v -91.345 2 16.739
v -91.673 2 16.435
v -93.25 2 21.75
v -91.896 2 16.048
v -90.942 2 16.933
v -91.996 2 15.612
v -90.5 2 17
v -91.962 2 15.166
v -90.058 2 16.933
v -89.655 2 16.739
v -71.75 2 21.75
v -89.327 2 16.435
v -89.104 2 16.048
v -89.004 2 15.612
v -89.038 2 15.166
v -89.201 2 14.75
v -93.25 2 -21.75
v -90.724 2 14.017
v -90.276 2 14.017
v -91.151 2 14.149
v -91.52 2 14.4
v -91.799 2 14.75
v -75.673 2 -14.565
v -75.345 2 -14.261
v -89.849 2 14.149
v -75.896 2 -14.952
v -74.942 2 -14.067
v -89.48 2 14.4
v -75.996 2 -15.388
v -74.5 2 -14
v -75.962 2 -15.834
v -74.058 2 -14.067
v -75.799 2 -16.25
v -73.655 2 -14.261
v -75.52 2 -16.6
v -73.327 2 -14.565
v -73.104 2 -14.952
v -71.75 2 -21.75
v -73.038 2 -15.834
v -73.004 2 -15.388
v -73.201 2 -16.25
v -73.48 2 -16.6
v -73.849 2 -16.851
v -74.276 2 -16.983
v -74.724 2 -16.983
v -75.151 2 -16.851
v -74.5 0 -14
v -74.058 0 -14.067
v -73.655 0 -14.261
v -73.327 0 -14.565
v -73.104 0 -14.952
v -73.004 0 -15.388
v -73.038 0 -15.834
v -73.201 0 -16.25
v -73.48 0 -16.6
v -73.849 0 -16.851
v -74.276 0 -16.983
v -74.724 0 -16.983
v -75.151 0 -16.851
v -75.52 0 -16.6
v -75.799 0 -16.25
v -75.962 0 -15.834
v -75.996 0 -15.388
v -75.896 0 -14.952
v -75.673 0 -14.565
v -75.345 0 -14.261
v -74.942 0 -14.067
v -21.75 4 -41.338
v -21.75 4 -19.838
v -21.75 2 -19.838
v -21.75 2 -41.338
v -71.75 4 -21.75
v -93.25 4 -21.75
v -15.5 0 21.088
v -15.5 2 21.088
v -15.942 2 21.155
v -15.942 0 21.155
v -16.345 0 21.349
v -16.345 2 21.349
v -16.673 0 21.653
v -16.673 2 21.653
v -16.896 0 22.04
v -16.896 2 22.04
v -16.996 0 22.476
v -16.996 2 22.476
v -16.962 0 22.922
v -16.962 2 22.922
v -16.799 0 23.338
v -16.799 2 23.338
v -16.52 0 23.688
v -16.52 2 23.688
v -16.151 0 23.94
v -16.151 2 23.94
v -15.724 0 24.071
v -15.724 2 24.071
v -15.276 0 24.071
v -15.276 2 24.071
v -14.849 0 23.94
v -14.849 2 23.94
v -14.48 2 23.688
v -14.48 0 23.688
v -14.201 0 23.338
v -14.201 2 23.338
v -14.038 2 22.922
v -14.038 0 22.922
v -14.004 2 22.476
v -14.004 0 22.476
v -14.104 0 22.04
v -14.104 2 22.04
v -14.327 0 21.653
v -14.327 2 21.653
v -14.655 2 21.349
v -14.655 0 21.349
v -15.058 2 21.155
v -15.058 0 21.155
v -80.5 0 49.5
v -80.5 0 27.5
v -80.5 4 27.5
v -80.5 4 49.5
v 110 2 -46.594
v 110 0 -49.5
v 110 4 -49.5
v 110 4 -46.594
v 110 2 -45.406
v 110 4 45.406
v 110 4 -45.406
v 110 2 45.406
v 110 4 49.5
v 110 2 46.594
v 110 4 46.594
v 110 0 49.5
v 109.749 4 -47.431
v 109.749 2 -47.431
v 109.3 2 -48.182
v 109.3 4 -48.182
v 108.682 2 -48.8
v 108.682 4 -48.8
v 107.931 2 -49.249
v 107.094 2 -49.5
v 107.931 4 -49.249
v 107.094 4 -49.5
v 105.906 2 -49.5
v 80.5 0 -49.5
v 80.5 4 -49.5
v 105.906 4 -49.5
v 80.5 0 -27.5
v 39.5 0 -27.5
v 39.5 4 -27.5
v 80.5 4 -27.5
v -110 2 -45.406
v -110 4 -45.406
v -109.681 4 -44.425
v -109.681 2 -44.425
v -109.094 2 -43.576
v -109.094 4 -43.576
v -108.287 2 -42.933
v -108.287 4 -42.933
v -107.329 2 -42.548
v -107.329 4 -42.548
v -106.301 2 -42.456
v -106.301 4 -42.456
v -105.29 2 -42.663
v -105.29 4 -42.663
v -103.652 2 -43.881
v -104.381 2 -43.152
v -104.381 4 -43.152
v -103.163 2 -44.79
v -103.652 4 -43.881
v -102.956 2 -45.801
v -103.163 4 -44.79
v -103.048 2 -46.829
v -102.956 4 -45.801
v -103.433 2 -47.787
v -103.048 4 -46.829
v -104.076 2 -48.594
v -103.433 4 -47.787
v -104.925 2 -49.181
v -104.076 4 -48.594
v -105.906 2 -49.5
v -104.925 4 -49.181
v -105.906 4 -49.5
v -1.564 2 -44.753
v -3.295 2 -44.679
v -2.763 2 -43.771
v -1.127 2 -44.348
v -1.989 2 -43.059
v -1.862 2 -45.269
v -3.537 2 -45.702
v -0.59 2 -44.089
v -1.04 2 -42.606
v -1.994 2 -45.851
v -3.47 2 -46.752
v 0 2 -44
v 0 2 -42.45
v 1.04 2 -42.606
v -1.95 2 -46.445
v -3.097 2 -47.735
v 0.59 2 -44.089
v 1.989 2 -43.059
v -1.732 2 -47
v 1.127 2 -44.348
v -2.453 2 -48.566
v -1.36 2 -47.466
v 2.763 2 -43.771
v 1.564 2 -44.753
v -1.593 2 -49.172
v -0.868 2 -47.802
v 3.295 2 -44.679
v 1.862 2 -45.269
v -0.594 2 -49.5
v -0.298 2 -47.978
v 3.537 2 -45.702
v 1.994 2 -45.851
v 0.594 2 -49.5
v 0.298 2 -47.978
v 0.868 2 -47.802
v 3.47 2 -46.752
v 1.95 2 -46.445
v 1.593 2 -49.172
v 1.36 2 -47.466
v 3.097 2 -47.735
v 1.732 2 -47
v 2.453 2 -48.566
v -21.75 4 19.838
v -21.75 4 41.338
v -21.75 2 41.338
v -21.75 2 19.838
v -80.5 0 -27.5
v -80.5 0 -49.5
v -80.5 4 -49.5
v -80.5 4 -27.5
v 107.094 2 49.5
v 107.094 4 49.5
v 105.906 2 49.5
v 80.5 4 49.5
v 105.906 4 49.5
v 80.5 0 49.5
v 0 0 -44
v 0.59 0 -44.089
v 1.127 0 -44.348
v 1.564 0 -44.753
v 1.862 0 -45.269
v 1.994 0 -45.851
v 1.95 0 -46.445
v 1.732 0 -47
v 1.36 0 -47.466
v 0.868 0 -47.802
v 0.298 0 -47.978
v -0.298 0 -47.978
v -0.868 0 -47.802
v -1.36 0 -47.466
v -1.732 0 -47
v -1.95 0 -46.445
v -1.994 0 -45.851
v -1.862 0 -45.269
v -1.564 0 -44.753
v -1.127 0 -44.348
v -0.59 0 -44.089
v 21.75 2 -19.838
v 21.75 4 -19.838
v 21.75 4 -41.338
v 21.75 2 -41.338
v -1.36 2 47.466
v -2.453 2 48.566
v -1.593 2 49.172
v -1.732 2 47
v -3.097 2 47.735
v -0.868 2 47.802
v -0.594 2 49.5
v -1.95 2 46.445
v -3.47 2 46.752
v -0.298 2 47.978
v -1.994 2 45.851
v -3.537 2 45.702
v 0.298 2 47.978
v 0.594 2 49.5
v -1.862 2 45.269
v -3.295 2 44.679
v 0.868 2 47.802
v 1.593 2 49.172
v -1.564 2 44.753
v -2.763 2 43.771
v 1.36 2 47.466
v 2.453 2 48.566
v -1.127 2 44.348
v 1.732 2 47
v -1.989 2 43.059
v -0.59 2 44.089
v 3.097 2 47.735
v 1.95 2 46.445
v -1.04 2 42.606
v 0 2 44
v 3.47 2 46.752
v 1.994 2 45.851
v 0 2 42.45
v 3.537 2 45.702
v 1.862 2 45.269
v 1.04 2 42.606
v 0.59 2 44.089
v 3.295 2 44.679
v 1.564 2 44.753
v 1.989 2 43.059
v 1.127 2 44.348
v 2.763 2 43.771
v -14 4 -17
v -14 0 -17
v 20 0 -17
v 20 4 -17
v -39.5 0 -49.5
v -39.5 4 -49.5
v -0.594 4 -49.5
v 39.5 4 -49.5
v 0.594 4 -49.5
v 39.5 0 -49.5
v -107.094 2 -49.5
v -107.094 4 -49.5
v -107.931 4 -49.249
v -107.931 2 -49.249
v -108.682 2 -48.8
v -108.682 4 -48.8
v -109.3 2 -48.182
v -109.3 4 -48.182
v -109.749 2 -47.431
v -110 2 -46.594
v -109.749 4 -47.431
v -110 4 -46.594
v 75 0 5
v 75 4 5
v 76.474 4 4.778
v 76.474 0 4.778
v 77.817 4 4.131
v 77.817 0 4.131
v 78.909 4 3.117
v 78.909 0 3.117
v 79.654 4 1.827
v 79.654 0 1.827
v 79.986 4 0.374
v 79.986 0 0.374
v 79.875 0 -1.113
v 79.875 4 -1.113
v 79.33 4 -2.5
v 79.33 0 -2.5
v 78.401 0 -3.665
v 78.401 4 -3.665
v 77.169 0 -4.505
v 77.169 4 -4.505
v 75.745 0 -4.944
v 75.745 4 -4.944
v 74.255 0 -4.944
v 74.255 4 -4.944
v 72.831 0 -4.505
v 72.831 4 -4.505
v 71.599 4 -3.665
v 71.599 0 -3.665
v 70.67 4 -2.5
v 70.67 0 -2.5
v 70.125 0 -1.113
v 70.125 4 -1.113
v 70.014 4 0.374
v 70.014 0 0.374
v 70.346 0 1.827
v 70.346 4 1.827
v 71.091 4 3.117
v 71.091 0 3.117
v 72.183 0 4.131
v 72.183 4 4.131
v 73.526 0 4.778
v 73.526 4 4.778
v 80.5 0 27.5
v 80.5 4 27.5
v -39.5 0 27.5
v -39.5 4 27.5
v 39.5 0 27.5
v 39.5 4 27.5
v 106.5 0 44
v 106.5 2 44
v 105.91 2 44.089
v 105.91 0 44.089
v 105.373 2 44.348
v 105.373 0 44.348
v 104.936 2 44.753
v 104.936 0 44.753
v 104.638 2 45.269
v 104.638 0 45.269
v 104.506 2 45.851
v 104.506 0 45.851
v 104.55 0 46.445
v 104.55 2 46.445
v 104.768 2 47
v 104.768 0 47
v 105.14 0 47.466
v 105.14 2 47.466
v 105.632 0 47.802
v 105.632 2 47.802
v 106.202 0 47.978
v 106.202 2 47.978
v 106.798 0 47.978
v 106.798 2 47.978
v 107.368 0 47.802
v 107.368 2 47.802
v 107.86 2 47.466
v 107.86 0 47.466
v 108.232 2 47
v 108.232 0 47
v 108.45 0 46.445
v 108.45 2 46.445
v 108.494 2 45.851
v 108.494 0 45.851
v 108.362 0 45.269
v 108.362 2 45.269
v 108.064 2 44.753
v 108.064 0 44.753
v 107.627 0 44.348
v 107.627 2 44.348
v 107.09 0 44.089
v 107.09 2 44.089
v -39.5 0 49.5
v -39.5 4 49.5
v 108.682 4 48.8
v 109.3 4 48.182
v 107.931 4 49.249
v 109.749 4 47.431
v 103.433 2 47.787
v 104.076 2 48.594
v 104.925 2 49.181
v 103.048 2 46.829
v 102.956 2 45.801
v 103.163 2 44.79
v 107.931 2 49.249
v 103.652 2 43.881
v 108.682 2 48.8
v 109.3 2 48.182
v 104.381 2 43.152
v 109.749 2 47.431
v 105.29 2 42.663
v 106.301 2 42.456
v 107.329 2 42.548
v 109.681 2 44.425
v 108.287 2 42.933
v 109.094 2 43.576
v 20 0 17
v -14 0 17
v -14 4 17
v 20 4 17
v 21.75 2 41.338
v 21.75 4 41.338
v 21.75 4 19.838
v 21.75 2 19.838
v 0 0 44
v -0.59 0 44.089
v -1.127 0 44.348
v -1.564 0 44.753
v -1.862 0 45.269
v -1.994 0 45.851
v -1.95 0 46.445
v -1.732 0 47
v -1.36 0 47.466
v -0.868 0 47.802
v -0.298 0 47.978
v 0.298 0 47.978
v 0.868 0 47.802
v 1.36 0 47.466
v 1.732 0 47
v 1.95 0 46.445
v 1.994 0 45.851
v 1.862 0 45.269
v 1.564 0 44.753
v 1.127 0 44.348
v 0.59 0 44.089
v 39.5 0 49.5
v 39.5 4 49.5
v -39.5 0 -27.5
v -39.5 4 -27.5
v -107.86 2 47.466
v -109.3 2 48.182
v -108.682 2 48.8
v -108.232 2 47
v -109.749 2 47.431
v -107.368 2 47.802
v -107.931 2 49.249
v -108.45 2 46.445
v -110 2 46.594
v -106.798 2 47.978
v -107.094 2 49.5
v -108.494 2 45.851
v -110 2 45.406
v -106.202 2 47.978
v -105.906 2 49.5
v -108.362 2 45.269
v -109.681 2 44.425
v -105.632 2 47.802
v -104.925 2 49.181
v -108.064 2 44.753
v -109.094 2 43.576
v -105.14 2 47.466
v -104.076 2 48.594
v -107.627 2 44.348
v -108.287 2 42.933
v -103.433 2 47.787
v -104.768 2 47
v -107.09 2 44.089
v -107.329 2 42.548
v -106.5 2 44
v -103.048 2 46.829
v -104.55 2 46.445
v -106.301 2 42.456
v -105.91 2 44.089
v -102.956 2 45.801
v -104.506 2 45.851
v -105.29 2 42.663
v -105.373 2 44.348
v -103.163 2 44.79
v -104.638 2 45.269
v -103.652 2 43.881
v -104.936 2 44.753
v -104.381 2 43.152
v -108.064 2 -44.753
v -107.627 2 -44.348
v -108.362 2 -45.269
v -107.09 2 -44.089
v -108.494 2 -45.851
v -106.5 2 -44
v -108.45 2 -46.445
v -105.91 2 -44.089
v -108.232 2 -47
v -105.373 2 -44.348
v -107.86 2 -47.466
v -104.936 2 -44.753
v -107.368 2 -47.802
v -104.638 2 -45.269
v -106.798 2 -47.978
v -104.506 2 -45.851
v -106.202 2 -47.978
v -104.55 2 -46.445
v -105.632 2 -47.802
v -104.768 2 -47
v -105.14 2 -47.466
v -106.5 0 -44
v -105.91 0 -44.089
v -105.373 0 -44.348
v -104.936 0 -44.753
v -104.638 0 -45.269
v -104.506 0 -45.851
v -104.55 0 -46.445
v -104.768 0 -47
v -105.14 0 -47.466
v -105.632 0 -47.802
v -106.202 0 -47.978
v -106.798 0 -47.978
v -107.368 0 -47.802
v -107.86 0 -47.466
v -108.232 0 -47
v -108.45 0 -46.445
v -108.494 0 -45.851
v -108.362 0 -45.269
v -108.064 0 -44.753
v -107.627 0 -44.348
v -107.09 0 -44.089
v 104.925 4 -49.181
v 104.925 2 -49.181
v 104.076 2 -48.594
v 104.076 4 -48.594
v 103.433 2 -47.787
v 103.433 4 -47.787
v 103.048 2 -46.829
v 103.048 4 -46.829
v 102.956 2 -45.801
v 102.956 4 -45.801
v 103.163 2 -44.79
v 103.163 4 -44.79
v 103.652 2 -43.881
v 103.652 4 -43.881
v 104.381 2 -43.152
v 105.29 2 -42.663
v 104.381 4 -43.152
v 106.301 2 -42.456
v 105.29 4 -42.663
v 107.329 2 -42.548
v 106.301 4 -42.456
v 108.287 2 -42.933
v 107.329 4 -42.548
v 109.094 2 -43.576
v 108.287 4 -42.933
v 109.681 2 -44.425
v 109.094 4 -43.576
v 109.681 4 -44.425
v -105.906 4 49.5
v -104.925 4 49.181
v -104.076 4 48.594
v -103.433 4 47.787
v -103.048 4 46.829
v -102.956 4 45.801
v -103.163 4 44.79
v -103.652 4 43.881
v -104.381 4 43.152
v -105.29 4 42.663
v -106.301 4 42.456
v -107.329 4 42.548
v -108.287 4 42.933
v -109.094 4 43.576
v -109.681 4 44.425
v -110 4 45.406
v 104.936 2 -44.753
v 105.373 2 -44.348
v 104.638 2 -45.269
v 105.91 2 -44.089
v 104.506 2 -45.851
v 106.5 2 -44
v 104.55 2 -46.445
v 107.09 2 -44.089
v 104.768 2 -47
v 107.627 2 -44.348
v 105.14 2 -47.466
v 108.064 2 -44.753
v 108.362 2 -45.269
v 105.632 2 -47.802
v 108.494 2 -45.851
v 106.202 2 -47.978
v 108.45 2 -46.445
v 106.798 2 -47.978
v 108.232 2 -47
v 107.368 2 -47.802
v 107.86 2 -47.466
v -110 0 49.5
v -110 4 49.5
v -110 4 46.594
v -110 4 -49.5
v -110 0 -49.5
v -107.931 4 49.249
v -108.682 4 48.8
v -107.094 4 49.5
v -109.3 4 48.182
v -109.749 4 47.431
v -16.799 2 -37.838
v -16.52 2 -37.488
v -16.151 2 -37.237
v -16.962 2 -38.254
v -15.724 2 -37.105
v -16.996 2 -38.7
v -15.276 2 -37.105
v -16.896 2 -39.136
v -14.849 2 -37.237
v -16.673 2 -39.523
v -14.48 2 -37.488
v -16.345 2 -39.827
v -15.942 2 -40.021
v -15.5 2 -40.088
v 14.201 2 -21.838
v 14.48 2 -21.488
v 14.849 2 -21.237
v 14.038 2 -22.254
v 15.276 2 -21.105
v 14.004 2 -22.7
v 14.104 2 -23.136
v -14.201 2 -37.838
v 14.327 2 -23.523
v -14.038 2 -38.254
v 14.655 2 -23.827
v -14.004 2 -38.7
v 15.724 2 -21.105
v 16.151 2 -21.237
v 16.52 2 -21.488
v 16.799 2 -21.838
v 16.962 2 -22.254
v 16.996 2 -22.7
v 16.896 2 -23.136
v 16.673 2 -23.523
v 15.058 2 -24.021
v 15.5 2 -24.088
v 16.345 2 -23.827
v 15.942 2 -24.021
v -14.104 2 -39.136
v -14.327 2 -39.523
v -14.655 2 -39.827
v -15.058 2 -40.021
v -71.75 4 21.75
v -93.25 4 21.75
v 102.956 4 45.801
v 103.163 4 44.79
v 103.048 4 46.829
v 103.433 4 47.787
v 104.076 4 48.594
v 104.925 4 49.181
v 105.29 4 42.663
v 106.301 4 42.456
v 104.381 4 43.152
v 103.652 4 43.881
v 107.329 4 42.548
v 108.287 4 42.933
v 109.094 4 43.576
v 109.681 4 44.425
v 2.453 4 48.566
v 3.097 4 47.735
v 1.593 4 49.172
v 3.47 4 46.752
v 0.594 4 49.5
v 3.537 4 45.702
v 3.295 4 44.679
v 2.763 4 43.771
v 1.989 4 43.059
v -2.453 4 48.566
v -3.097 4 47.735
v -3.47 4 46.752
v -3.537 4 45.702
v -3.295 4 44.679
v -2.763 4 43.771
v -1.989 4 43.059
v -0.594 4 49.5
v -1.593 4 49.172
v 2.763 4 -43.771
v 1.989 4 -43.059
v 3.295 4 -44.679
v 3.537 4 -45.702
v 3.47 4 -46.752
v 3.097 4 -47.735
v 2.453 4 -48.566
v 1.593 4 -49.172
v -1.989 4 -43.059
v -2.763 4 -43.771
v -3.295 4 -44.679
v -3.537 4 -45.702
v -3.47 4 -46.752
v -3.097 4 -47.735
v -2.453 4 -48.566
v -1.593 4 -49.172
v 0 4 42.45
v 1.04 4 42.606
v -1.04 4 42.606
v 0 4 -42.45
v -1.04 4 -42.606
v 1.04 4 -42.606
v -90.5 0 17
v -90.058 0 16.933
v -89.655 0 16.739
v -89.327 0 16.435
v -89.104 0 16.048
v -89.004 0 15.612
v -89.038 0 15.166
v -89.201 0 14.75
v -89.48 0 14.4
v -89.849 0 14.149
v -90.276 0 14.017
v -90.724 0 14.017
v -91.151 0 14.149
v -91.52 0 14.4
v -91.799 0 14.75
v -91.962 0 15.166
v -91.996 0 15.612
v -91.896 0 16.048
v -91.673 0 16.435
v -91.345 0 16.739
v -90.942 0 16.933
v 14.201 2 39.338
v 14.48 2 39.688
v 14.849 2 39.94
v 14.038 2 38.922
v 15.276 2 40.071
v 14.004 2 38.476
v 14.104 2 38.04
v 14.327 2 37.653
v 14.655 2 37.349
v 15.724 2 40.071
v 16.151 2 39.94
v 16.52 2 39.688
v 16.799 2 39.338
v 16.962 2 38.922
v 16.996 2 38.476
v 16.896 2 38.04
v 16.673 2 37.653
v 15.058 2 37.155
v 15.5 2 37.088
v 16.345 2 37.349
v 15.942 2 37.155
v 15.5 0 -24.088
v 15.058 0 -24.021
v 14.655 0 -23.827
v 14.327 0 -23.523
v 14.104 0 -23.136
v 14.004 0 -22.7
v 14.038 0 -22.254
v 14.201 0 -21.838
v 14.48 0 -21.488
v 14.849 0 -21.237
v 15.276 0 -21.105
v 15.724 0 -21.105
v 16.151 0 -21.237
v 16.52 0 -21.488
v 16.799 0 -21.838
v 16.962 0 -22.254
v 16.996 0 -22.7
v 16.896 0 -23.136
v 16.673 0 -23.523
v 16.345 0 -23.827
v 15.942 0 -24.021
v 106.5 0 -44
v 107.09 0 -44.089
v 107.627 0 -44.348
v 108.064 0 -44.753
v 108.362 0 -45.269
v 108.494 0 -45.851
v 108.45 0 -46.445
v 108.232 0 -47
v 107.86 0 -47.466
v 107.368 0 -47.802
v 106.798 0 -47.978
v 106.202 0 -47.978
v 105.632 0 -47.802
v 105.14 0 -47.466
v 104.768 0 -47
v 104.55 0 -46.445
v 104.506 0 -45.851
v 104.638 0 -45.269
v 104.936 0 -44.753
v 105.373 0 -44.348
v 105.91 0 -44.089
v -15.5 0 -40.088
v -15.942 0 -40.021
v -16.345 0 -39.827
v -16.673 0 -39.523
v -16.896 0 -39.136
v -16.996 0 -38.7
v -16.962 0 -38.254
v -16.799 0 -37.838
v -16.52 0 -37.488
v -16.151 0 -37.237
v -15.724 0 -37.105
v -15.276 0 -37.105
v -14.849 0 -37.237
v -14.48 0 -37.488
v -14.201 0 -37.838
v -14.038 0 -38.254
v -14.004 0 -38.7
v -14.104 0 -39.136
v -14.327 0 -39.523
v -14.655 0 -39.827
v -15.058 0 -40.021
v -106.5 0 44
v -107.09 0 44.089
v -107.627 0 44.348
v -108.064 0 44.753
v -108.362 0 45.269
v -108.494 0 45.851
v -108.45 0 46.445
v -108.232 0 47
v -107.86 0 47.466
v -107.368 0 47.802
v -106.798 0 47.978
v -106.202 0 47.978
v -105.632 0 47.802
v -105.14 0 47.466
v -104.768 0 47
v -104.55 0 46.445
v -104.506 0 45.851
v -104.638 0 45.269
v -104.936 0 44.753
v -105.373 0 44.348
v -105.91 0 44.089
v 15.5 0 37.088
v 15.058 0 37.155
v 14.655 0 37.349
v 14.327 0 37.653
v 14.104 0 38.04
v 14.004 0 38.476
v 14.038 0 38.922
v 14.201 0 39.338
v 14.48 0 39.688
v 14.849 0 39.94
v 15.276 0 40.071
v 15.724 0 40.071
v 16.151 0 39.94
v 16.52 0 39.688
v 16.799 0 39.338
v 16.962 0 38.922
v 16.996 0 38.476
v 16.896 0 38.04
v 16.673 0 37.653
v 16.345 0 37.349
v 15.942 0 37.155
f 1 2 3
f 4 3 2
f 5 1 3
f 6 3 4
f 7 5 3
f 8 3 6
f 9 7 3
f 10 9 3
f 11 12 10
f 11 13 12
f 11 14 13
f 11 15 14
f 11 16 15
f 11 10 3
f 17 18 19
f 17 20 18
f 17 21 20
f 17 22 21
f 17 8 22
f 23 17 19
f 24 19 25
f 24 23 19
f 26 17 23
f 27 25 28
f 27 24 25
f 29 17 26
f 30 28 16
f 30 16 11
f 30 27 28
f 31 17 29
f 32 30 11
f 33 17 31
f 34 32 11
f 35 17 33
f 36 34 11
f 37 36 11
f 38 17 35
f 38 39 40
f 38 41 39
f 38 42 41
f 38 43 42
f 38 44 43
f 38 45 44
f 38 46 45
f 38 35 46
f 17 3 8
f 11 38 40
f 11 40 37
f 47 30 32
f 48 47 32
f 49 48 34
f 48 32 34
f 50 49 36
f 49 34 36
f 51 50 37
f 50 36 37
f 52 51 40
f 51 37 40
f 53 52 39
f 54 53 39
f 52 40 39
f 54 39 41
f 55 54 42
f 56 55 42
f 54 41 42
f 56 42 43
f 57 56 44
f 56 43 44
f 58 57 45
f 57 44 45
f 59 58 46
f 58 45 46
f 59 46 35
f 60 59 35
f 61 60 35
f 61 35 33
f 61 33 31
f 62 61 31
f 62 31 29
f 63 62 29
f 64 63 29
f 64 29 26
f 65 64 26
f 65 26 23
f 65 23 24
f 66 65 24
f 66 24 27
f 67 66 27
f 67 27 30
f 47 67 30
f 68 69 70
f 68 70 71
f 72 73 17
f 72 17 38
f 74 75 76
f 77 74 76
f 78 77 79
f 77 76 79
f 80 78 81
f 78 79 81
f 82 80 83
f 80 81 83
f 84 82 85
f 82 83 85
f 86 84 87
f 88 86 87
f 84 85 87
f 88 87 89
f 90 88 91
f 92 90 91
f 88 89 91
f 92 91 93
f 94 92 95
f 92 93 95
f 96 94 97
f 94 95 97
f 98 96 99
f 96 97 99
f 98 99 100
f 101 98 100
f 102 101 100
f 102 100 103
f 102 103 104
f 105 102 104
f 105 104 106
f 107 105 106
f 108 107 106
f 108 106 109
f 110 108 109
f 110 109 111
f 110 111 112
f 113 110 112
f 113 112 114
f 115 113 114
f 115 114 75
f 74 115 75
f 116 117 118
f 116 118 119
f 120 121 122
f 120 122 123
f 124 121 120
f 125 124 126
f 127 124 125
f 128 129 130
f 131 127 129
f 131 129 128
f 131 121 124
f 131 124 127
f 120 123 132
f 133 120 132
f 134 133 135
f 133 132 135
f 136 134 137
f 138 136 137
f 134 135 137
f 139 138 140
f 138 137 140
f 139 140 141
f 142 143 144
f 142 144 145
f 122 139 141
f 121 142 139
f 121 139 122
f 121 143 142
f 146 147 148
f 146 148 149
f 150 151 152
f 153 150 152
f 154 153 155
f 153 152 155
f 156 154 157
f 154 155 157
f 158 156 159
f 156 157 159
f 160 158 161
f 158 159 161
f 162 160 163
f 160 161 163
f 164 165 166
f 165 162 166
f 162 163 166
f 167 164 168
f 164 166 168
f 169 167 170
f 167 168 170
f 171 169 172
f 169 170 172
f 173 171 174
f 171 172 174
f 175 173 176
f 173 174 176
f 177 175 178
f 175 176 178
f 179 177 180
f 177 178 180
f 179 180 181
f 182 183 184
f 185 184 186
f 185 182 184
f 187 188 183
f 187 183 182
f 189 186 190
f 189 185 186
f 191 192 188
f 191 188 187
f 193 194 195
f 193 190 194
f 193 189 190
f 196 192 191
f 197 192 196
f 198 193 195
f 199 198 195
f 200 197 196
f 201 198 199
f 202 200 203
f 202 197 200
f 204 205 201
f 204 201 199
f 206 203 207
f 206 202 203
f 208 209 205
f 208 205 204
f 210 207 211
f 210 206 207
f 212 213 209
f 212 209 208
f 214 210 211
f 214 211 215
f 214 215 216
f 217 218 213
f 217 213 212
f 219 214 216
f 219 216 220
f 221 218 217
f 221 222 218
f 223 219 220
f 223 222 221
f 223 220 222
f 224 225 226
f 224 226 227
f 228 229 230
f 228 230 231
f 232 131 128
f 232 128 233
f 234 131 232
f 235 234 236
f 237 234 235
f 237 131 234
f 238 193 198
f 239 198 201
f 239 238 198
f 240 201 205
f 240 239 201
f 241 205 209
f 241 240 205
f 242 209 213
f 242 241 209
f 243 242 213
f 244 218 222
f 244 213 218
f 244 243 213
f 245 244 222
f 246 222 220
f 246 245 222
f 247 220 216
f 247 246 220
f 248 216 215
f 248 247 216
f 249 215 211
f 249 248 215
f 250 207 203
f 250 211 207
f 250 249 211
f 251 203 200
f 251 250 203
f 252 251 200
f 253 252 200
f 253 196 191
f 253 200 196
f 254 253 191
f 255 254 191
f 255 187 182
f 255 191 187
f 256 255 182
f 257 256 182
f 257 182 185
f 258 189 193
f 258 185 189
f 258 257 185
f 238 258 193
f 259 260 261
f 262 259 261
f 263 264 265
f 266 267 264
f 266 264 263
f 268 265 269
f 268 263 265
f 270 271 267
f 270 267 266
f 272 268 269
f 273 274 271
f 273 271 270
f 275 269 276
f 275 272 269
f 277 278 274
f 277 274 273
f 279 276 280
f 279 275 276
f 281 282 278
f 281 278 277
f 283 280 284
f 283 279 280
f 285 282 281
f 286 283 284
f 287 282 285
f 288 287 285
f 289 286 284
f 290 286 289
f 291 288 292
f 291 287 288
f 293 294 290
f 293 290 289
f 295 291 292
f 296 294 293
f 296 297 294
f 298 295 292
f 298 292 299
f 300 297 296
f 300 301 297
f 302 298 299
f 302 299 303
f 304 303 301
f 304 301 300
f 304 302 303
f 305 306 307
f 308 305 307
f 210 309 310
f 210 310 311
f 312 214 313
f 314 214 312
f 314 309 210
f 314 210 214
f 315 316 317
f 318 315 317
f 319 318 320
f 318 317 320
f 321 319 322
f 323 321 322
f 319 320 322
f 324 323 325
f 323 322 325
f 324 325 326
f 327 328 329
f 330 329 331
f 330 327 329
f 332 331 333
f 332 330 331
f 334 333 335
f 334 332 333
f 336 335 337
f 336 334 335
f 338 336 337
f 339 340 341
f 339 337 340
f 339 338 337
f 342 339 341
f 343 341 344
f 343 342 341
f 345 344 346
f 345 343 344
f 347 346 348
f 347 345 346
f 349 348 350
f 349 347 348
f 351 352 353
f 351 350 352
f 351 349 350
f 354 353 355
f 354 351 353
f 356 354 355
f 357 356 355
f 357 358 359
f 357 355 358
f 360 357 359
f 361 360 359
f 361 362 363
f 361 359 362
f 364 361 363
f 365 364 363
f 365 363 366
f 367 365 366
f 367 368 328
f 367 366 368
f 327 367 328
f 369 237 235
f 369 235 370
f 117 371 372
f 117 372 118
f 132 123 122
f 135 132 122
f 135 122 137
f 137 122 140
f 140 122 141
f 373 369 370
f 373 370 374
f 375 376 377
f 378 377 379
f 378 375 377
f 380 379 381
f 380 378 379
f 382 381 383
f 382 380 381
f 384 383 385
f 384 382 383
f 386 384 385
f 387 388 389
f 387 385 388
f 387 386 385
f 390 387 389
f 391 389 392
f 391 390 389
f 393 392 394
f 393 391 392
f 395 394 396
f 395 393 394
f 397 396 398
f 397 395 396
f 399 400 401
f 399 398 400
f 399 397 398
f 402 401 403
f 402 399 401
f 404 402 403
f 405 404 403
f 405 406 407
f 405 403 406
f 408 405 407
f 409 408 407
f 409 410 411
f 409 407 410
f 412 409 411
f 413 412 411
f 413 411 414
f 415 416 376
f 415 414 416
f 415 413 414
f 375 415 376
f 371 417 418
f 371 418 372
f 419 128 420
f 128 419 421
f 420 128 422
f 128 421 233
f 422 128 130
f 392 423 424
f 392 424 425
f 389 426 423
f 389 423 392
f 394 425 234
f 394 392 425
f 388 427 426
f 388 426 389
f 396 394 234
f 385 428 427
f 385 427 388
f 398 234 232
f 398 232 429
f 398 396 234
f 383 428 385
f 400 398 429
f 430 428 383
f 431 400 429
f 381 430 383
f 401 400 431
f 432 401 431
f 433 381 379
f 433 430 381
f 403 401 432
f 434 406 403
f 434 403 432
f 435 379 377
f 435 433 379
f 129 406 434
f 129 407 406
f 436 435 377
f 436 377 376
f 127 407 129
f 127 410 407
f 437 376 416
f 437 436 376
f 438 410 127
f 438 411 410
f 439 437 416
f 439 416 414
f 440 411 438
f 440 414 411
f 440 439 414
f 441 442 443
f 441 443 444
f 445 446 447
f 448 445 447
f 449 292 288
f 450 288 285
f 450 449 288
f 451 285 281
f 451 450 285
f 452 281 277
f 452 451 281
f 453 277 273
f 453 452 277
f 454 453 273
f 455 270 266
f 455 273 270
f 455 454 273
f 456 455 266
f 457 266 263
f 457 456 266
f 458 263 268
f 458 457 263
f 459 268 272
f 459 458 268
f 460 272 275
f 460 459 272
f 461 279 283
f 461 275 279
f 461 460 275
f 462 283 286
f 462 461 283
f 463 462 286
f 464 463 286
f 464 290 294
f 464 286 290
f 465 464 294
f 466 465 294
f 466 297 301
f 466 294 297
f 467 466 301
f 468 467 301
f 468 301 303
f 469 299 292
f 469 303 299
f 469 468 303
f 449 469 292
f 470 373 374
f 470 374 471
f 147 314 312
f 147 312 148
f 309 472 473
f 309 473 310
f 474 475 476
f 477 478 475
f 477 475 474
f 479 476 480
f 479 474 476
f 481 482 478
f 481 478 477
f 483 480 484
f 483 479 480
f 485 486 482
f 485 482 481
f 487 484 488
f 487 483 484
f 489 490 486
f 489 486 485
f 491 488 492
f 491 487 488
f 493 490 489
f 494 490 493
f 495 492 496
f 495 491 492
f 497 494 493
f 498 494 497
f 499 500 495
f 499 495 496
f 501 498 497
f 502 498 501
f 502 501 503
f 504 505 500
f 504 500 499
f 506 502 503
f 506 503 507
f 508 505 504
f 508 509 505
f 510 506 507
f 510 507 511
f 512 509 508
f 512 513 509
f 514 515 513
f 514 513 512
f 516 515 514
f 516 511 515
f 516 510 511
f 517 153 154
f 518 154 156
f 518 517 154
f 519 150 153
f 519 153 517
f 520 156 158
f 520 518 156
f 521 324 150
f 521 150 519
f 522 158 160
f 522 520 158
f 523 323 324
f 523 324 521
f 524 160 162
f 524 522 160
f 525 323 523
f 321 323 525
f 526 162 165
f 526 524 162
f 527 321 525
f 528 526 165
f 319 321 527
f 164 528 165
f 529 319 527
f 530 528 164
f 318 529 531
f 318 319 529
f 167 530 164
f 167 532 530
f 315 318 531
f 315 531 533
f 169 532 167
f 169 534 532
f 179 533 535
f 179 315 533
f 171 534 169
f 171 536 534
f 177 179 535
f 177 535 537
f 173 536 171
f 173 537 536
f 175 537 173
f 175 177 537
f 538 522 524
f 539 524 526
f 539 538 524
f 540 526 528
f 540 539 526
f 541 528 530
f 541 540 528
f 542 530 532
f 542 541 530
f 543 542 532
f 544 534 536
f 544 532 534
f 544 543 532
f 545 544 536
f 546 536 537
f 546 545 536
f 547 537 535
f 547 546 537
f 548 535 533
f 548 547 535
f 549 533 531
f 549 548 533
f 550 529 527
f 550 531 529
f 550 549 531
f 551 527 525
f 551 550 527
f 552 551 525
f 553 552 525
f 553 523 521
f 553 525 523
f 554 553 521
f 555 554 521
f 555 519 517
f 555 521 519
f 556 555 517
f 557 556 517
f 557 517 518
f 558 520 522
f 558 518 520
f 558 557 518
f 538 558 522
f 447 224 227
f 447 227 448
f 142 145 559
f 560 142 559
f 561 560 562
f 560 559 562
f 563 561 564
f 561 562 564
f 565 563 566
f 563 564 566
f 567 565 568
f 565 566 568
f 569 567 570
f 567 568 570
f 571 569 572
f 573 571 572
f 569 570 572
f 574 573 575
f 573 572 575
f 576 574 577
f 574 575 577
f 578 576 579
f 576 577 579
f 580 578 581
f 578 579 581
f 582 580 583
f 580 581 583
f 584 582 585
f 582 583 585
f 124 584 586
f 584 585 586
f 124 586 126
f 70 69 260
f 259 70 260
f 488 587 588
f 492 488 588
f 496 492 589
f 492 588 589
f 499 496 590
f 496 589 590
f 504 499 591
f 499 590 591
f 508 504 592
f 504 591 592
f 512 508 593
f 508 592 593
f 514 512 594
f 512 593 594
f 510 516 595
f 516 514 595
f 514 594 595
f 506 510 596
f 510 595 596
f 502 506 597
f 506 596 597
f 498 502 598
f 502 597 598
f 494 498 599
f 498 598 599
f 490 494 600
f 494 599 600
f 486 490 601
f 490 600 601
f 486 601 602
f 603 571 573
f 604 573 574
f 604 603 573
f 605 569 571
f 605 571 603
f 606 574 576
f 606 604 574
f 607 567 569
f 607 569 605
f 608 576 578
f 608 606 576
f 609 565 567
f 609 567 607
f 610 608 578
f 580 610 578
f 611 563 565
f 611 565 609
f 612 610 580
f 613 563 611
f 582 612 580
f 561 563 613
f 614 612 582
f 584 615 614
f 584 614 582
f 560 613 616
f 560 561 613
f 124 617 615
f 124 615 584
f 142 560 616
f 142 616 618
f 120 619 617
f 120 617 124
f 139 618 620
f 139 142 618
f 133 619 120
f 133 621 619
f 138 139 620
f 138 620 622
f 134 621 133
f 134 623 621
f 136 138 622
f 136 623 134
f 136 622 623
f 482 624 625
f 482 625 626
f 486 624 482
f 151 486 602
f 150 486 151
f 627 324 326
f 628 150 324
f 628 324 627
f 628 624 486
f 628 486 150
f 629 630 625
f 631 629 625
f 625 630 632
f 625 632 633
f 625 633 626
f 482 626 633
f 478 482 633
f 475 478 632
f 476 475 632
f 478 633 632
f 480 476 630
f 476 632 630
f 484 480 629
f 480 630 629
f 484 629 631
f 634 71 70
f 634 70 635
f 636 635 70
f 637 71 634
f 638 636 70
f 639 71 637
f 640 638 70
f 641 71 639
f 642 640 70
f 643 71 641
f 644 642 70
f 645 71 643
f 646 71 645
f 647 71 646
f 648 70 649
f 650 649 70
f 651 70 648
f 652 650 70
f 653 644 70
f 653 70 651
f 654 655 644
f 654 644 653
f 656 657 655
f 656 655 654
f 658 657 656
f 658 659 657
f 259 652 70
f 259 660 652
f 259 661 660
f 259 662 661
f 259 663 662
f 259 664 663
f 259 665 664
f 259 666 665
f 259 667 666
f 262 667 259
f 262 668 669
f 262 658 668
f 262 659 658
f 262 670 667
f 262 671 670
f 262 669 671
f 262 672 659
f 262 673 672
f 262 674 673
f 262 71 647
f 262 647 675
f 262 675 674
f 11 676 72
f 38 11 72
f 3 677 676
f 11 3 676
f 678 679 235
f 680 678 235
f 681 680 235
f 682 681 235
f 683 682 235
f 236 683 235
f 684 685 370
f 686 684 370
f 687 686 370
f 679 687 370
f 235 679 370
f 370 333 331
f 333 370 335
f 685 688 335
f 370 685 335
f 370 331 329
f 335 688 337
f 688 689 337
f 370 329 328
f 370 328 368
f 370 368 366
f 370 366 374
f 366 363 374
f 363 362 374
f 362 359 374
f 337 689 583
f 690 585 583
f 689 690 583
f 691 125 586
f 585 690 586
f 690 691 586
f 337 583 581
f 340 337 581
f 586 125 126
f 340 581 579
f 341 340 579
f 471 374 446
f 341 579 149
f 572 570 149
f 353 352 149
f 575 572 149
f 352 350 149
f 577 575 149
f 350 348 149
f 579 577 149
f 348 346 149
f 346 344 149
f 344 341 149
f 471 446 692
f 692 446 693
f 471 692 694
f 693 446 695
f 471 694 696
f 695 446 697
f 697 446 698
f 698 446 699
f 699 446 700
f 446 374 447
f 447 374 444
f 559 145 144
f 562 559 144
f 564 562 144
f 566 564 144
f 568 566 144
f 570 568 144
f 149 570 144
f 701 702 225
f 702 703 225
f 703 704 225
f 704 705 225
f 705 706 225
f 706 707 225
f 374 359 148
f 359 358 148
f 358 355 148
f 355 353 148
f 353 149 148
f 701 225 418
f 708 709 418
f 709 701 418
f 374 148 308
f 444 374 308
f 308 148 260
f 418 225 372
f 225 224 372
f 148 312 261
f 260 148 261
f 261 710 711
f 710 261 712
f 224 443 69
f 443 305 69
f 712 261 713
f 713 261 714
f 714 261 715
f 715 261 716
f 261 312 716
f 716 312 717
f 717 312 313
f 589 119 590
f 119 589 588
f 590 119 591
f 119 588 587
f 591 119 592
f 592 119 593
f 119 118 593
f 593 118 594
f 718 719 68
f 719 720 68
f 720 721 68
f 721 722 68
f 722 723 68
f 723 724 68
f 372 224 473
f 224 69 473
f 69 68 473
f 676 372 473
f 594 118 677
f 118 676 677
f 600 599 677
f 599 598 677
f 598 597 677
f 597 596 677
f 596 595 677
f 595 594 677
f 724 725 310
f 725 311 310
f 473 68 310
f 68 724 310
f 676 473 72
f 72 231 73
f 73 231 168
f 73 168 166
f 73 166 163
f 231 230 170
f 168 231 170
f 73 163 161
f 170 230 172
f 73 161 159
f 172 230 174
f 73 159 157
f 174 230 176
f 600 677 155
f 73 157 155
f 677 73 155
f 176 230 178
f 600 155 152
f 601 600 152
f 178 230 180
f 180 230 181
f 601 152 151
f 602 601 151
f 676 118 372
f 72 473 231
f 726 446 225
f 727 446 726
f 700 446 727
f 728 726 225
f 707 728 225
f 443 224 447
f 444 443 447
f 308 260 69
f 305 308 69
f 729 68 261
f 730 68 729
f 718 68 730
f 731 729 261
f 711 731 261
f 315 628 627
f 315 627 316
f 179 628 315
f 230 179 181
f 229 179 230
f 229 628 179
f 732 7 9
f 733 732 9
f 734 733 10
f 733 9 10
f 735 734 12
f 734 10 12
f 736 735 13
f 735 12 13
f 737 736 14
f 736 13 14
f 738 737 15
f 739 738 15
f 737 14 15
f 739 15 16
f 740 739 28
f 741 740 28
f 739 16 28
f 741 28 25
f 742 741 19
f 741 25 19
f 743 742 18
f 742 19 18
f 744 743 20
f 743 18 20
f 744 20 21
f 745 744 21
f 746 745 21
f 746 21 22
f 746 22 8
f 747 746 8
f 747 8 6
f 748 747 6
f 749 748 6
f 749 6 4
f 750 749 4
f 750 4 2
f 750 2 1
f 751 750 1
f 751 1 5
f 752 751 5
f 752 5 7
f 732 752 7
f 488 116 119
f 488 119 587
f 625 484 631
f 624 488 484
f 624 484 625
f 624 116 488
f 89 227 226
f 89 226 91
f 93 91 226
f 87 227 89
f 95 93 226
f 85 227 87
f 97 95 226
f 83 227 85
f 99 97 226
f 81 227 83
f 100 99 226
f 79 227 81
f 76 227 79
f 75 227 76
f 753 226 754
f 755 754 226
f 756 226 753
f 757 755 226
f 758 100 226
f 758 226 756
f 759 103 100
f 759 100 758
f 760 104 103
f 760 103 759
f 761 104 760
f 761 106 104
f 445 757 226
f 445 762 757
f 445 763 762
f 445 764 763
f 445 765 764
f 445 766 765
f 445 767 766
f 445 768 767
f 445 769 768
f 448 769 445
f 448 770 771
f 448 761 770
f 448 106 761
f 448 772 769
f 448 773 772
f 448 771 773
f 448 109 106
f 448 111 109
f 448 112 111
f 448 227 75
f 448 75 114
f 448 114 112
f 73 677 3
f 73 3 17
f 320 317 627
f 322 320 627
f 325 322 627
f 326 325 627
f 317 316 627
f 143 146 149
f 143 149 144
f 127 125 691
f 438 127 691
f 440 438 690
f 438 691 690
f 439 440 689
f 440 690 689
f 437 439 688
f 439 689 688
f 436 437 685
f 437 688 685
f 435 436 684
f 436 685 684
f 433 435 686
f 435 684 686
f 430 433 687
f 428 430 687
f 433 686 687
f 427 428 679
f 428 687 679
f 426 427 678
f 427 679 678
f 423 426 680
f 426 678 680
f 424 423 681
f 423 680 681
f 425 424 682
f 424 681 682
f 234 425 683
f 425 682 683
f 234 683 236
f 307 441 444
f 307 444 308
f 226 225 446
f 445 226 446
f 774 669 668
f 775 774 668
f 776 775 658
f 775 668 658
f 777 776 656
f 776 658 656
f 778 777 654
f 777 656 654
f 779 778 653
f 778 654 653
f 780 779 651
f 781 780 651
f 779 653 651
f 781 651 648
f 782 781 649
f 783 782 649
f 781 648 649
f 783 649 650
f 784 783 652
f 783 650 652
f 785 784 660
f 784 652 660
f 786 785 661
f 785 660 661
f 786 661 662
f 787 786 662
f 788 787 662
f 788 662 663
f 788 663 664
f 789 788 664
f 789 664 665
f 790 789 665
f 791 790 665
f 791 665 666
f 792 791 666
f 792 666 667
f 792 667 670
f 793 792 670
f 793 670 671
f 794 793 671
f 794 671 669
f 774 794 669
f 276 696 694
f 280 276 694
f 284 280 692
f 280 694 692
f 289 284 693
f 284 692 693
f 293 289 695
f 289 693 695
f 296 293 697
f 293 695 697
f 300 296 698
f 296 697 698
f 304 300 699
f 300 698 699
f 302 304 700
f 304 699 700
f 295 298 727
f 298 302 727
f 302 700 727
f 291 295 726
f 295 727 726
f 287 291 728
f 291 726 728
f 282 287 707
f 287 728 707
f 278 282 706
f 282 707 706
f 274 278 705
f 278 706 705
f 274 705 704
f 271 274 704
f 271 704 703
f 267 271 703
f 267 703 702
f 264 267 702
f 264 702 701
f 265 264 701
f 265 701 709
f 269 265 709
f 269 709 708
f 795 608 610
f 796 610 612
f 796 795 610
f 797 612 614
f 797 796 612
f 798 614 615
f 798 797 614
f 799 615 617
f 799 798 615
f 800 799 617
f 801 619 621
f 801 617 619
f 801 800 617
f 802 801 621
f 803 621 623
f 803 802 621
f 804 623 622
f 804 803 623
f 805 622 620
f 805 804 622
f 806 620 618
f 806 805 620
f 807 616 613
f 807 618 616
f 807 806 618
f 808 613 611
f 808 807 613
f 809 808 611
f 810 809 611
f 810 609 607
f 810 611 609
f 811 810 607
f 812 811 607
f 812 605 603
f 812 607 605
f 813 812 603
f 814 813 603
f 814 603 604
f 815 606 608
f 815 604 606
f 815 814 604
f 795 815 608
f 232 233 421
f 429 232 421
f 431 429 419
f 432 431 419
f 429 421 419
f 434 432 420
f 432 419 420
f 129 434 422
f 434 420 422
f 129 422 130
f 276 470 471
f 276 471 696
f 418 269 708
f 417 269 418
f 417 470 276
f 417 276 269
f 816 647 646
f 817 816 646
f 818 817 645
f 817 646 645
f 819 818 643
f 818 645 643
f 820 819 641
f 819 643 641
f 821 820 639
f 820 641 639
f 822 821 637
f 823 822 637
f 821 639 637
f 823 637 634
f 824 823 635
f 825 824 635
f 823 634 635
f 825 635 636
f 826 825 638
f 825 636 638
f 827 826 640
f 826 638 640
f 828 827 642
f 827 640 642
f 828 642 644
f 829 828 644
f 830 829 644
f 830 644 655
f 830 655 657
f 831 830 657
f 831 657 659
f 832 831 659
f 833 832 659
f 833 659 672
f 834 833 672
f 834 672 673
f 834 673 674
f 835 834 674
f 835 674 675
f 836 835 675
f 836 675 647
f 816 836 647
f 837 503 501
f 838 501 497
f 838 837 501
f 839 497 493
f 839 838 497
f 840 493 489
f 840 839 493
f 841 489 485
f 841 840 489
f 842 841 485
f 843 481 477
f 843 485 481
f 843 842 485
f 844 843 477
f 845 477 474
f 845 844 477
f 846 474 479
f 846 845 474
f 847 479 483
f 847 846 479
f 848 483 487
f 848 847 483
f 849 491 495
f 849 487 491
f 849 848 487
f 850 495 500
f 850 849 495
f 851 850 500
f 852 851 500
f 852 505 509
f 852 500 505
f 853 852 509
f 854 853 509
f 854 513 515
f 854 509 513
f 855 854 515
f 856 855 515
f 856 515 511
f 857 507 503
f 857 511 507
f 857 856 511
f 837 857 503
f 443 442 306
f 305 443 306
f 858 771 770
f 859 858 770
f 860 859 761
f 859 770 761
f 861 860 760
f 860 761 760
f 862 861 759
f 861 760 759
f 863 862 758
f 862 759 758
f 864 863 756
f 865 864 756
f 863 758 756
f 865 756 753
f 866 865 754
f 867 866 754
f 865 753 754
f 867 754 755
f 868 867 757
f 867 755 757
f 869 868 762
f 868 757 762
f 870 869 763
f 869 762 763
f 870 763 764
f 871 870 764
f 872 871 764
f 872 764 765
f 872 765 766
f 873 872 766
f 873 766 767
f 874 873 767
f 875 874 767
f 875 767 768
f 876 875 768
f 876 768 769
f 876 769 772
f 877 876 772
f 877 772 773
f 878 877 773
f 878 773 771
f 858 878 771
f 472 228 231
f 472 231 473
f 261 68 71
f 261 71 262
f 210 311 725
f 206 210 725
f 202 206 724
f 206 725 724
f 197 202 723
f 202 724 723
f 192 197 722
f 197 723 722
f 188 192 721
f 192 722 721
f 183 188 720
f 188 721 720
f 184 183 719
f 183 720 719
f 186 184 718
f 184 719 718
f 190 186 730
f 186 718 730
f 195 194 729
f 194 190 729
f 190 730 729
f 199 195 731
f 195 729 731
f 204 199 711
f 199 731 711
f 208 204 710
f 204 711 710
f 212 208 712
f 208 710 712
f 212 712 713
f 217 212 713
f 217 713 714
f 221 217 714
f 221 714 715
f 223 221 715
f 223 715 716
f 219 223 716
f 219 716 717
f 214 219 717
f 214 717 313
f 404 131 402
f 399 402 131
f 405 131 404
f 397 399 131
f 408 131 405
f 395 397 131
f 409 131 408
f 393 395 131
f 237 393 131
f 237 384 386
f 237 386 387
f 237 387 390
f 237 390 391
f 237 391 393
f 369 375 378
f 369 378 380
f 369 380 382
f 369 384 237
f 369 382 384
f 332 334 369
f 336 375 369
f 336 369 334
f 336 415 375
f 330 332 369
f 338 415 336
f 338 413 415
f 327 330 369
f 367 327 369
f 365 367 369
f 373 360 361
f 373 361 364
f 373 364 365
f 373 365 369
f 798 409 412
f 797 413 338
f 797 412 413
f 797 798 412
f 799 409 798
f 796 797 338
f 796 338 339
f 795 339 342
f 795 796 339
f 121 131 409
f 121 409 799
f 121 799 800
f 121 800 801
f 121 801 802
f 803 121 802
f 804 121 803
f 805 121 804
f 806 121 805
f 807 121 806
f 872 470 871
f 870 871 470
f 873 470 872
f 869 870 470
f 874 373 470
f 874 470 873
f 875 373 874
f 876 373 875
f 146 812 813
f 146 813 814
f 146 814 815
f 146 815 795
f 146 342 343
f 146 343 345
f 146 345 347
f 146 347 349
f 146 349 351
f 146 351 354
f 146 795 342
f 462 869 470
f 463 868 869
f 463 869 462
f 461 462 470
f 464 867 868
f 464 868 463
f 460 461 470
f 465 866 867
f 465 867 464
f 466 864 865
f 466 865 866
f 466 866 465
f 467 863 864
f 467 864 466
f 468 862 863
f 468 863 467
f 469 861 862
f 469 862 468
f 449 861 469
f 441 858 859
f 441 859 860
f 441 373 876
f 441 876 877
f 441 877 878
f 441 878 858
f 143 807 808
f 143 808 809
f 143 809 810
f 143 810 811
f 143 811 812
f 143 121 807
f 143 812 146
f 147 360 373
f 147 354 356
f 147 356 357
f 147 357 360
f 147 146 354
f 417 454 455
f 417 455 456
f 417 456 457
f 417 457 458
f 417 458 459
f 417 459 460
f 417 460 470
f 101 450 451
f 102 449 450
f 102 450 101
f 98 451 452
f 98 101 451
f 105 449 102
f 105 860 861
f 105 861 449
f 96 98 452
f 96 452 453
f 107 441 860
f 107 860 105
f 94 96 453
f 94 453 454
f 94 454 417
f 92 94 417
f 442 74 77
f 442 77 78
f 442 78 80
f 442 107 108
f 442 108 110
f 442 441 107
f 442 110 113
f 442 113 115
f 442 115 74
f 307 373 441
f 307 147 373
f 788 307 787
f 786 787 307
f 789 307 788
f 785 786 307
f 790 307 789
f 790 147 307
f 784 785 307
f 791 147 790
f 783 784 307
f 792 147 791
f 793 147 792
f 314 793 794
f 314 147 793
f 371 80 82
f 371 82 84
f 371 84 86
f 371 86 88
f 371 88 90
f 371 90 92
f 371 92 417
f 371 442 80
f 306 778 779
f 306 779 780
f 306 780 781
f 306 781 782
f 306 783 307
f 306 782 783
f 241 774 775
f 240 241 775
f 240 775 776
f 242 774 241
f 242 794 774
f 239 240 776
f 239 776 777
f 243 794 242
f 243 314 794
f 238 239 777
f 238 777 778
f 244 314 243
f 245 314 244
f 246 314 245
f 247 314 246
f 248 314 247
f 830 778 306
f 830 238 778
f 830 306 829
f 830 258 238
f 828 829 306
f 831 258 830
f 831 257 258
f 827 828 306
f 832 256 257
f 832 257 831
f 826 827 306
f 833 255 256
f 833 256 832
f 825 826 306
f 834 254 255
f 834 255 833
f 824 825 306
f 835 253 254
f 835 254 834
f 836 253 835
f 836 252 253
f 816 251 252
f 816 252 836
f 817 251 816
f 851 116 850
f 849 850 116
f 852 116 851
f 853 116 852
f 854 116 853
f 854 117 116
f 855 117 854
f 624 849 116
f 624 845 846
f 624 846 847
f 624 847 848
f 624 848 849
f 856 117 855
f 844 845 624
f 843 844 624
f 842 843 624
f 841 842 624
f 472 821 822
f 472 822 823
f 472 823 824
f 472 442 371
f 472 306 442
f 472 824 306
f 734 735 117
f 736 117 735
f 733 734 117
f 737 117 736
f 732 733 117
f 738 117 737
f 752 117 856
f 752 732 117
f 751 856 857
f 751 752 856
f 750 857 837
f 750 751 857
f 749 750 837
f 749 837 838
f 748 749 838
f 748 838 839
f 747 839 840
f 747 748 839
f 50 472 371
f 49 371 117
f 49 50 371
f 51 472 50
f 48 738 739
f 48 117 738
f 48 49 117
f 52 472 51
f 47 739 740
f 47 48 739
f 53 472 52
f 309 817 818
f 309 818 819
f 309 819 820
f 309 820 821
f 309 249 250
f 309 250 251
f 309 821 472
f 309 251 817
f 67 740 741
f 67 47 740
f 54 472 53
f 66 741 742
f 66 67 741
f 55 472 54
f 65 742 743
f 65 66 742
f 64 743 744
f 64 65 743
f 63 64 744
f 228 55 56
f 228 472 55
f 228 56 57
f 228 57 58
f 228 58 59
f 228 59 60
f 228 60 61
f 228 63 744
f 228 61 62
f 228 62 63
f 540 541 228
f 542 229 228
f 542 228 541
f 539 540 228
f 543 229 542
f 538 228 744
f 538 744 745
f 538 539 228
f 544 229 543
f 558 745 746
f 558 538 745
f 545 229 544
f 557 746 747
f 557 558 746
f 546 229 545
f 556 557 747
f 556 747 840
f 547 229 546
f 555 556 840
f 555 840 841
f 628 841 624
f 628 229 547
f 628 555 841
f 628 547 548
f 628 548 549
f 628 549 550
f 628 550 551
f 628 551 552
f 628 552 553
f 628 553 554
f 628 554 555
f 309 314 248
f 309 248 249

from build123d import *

# Parameters (mm, degrees)
EXTRUDE_1_DEPTH      = 4
SKETCH_11_R          = 2
SKETCH_11_R_2        = 5
SKETCH_11_W          = 34
SKETCH_11_H          = 34
CUT_EXTRUDE_8_DEPTH  = 121.690720439
SKETCH_12_R          = 3.55
CUT_EXTRUDE_9_DEPTH  = 2
SKETCH_13_W          = 21.5
SKETCH_13_H          = 43.5
SKETCH_13_W_2        = 43.5
SKETCH_13_H_2        = 21.5
CUT_EXTRUDE_10_DEPTH = 2
SKETCH_14_R          = 1.5
CUT_EXTRUDE_11_DEPTH = 121.640996349


with BuildPart() as part:
    # 草圖1 → 填料-伸長1 (new body)
    with BuildSketch(Plane(origin=(0, 0, 0), x_dir=(1, 0, 0), z_dir=(0, 1, 0))):
        Polygon((-39.5, 49.5), (39.5, 49.5), (39.5, 27.5), (80.5, 27.5), (80.5, 49.5), (110, 49.5), (110, -49.5), (80.5, -49.5), (80.5, -27.5), (39.5, -27.5), (39.5, -49.5), (-39.5, -49.5), (-39.5, -27.5), (-80.5, -27.5), (-80.5, -49.5), (-110, -49.5), (-110, 49.5), (-80.5, 49.5), (-80.5, 27.5), (-39.5, 27.5), align=None)
    extrude(amount=EXTRUDE_1_DEPTH)

    # 草圖11 → 除料-伸長8 (cut, through all)
    with BuildSketch(Plane(origin=(0, 0, 0), x_dir=(1, 0, 0), z_dir=(0, 1, 0))):
        with Locations(Location((-106.5, 46, 0), (0, 0, 270))):
            Circle(SKETCH_11_R)
        with Locations(Location((-2.39e-07, 46, 0), (0, 0, 270))):
            Circle(SKETCH_11_R)
        with Locations(Location((106.5, 46, 0), (0, 0, 270))):
            Circle(SKETCH_11_R)
        with Locations(Location((-2.39e-07, -46, 0), (0, 0, 90))):
            Circle(SKETCH_11_R)
        with Locations(Location((-106.5, -46, 0), (0, 0, 90))):
            Circle(SKETCH_11_R)
        with Locations(Location((106.5, -46, 0), (0, 0, 90))):
            Circle(SKETCH_11_R)
        with Locations(Location((75, 0, 0), (0, 0, 270))):
            Circle(SKETCH_11_R_2)
        with Locations((3, 0)):
            Rectangle(SKETCH_11_W, SKETCH_11_H)
    extrude(amount=CUT_EXTRUDE_8_DEPTH, mode=Mode.SUBTRACT)

    # 草圖12 → 除料-伸長9 (cut)
    with BuildSketch(Plane(origin=(0, 4, 0), x_dir=(1, 0, 0), z_dir=(0, 1, 0))):
        with Locations((-106.5, 46)):
            Circle(SKETCH_12_R)
        with Locations((-2.39e-07, 46)):
            Circle(SKETCH_12_R)
        with Locations((-2.39e-07, -46)):
            Circle(SKETCH_12_R)
        with Locations((-106.5, -46)):
            Circle(SKETCH_12_R)
        with Locations((106.5, -46)):
            Circle(SKETCH_12_R)
        with Locations((106.5, 46)):
            Circle(SKETCH_12_R)
    extrude(amount=-CUT_EXTRUDE_9_DEPTH, mode=Mode.SUBTRACT)

    # 草圖13 → 除料-伸長10 (cut)
    with BuildSketch(Plane(origin=(0, 4, 0), x_dir=(1, 0, 0), z_dir=(0, 1, 0))):
        with Locations((-82.5, 0)):
            Rectangle(SKETCH_13_W, SKETCH_13_H)
        with Locations((0, -30.588054748)):
            Rectangle(SKETCH_13_W_2, SKETCH_13_H_2)
        with Locations((0, 30.588054748)):
            Rectangle(SKETCH_13_W_2, SKETCH_13_H_2)
    extrude(amount=-CUT_EXTRUDE_10_DEPTH, mode=Mode.SUBTRACT)

    # 草圖14 → 除料-伸長11 (cut, through all)
    with BuildSketch(Plane(origin=(0, 2, 0), x_dir=(1, 0, 0), z_dir=(0, 1, 0))):
        with Locations(Location((-74.5, 15.5, 0), (0, 0, 270))):
            Circle(SKETCH_14_R)
        with Locations(Location((-90.5, -15.5, 0), (0, 0, 270))):
            Circle(SKETCH_14_R)
        with Locations(Location((-15.5, -22.588054748, 0), (0, 0, 90))):
            Circle(SKETCH_14_R)
        with Locations(Location((15.5, -38.588054748, 0), (0, 0, 90))):
            Circle(SKETCH_14_R)
        with Locations(Location((15.5, 22.588054748, 0), (0, 0, 90))):
            Circle(SKETCH_14_R)
        with Locations(Location((-15.5, 38.588054748, 0), (0, 0, 90))):
            Circle(SKETCH_14_R)
    extrude(amount=-CUT_EXTRUDE_11_DEPTH, mode=Mode.SUBTRACT)


solid = part.part
